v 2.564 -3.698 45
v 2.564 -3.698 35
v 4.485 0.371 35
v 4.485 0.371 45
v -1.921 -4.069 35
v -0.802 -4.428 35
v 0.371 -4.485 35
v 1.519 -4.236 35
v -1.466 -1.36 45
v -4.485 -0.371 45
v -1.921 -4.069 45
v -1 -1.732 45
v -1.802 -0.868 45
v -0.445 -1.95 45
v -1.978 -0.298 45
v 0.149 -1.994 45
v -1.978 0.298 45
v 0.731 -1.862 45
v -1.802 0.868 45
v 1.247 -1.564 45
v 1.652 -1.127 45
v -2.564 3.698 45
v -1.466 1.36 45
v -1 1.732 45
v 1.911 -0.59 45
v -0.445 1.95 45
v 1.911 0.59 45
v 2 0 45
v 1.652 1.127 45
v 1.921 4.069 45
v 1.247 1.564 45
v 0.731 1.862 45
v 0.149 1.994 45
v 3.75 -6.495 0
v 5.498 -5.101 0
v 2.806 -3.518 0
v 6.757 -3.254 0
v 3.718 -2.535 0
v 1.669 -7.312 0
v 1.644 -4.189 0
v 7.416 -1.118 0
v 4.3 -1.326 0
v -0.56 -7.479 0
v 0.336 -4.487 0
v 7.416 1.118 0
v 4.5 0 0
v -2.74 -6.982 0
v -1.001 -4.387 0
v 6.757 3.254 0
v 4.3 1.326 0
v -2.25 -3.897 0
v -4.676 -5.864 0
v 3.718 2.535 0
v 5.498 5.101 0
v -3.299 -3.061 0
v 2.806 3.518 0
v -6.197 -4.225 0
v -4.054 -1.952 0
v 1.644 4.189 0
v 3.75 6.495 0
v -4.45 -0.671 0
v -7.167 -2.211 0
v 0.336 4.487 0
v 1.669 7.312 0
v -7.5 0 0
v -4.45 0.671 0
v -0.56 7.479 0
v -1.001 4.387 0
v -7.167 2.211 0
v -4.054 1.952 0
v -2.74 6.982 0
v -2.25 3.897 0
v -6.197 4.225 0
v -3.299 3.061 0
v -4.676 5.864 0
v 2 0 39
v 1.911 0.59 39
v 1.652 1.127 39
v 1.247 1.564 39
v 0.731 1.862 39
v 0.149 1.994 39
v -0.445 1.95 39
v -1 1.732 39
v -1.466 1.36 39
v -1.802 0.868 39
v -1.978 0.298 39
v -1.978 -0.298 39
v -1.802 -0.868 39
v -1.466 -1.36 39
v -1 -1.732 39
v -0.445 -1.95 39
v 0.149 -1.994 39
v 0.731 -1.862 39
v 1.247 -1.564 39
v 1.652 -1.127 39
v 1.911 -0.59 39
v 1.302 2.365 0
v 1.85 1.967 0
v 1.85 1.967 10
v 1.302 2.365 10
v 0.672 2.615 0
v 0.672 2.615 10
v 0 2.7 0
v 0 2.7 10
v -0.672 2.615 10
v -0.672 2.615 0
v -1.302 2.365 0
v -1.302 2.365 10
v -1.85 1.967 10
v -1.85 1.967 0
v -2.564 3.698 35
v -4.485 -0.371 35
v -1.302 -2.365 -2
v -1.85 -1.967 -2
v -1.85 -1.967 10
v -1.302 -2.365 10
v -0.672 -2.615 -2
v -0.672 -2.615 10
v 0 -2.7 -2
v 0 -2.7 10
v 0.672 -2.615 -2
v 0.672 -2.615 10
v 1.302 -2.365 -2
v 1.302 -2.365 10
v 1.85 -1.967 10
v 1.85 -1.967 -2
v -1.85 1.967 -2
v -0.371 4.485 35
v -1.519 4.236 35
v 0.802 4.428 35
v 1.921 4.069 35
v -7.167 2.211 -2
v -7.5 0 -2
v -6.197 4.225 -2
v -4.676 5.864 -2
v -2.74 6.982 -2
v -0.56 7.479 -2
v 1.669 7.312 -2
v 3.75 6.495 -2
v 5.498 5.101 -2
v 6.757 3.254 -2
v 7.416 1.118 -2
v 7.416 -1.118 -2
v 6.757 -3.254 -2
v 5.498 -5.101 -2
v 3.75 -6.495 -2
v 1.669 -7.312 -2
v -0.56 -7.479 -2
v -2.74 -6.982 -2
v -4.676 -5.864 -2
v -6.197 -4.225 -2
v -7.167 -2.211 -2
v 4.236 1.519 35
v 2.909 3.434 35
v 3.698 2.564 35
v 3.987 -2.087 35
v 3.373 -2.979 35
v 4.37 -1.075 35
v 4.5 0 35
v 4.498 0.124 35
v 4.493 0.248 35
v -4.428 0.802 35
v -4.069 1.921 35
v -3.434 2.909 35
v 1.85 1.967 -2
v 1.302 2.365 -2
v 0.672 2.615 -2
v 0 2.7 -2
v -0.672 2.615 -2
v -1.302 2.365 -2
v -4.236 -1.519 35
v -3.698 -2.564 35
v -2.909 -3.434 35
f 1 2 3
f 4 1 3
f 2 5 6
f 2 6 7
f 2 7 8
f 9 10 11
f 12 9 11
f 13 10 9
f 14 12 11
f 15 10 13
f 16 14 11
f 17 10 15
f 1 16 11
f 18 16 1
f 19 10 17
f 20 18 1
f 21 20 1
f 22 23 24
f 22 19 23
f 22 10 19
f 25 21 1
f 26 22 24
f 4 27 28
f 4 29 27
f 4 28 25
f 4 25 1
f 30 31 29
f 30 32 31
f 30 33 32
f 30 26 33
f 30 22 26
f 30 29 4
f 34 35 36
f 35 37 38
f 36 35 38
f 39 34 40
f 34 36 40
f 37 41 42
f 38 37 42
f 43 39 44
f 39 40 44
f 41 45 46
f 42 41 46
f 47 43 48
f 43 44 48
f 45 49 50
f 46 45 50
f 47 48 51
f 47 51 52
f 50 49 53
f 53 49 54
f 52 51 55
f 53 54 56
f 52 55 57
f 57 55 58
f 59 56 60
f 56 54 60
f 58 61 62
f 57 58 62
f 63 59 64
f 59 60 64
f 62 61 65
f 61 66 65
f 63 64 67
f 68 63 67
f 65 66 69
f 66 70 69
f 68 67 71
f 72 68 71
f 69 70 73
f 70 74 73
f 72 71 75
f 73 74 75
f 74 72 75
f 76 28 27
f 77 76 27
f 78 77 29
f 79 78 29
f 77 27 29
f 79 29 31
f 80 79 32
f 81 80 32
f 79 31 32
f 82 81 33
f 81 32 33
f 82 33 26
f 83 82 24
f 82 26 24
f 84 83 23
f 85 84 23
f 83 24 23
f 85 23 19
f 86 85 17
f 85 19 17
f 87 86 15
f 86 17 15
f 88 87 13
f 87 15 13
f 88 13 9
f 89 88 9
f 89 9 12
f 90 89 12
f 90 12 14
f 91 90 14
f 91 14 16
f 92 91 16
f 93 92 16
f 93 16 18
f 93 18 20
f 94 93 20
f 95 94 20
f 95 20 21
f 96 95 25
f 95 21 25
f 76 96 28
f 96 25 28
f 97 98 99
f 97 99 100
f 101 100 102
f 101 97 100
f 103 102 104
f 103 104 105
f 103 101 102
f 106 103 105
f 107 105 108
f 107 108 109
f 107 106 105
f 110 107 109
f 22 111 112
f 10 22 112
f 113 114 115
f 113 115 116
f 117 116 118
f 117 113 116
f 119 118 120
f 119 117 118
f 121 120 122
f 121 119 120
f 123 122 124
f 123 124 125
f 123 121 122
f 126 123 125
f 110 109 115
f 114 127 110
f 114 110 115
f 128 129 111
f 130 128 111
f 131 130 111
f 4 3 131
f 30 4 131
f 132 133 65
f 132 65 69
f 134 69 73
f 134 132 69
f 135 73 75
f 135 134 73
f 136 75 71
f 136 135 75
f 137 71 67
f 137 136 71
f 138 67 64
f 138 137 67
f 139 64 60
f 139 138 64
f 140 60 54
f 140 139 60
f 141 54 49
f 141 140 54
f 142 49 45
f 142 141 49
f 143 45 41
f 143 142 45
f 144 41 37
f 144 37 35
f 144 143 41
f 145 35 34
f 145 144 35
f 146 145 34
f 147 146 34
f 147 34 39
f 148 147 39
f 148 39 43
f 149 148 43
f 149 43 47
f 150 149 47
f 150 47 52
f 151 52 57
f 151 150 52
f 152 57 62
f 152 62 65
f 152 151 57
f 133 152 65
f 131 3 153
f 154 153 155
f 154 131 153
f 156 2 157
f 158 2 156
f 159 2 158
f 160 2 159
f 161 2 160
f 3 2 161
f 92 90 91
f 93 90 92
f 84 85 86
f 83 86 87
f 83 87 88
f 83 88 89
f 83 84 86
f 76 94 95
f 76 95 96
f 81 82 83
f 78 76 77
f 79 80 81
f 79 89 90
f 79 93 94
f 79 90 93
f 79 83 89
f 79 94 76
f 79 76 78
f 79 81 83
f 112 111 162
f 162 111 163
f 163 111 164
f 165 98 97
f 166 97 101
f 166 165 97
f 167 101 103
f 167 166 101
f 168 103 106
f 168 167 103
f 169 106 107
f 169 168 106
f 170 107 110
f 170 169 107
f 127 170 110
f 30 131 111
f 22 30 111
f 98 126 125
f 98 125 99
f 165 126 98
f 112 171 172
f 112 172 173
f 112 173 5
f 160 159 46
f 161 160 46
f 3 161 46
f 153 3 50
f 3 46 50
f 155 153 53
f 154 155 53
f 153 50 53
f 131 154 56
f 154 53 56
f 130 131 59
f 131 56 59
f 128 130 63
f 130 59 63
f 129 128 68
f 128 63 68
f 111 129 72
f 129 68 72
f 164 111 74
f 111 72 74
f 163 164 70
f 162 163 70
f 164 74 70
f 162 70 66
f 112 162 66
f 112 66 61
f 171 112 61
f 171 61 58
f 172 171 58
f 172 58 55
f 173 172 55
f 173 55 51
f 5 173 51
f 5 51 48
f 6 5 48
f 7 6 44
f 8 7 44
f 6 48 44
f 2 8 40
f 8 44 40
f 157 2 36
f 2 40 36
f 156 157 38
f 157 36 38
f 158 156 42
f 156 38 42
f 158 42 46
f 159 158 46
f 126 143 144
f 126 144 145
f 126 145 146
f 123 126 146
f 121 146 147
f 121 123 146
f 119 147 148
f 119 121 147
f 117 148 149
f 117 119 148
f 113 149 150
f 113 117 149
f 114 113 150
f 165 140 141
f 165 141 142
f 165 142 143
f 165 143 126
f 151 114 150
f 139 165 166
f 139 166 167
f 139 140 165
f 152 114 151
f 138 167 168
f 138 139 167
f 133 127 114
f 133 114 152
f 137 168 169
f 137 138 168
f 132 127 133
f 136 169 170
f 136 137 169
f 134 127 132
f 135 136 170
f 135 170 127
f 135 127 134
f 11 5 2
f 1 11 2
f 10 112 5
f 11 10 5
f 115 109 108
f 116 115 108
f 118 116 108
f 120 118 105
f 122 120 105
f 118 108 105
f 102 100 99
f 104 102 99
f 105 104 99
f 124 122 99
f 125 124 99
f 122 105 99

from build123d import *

# Parameters (mm, degrees)
SKETCH1_R           = 4.5
BOSS_EXTRUDE1_DEPTH = 10
BOSS_EXTRUDE2_START = 2
SKETCH2_R           = 7.5
BOSS_EXTRUDE2_DEPTH = 2
SKETCH3_R           = 4.5
BOSS_EXTRUDE3_DEPTH = 25
BOSS_EXTRUDE4_DEPTH = 10
SKETCH5_R           = 2
CUT_EXTRUDE1_DEPTH  = 6


with BuildPart() as part:
    # Sketch1 → Boss-Extrude1 (new body)
    with BuildSketch(Plane.XY):
        Circle(SKETCH1_R)
        with BuildLine():
            Line((-1.85, 1.966596044), (-1.85, -1.966596044))
            ThreePointArc((-1.85, -1.966596044), (0, -2.7), (1.85, -1.966596044))
            Line((1.85, -1.966596044), (1.85, 1.966596044))
            ThreePointArc((1.85, 1.966596044), (1.851058142, 1.9656001), (1.852115749, 1.964603587))
            ThreePointArc((1.852115749, 1.964603587), (0.001453124, 2.699999609), (-1.85, 1.966596044))
        make_face(mode=Mode.SUBTRACT)
    extrude(amount=BOSS_EXTRUDE1_DEPTH)

    # Sketch2 → Boss-Extrude2 (add)
    with BuildSketch(Plane(origin=(0, 0, 0), x_dir=(-1, 0, 0), z_dir=(0, 0, -1)).offset(BOSS_EXTRUDE2_START)):
        Circle(SKETCH2_R)
        with BuildLine():
            Line((1.85, 1.966596044), (1.85, -1.966596044))
            ThreePointArc((1.85, -1.966596044), (0, -2.7), (-1.85, -1.966596044))
            Line((-1.85, -1.966596044), (-1.85, 1.966596044))
            ThreePointArc((-1.85, 1.966596044), (0, 2.7), (1.85, 1.966596044))
        make_face(mode=Mode.SUBTRACT)
    extrude(amount=-BOSS_EXTRUDE2_DEPTH)

    # Sketch3 → Boss-Extrude3 (add)
    with BuildSketch(Plane.XY.offset(10)):
        Circle(SKETCH3_R)
    extrude(amount=BOSS_EXTRUDE3_DEPTH)

    # Sketch4 → Boss-Extrude4 (add)
    with BuildSketch(Plane.XY.offset(35)):
        Polygon((1.920788906, 4.069468022), (-2.563868233, 3.698185999), (-4.48465714, -0.371282023), (-1.920788906, -4.069468022), (2.563868233, -3.698185999), (4.48465714, 0.371282023), align=None)
    extrude(amount=BOSS_EXTRUDE4_DEPTH)

    # Sketch5 → Cut-Extrude1 (cut)
    with BuildSketch(Plane.XY.offset(45)):
        Circle(SKETCH5_R)
    extrude(amount=-CUT_EXTRUDE1_DEPTH, mode=Mode.SUBTRACT)


solid = part.part
